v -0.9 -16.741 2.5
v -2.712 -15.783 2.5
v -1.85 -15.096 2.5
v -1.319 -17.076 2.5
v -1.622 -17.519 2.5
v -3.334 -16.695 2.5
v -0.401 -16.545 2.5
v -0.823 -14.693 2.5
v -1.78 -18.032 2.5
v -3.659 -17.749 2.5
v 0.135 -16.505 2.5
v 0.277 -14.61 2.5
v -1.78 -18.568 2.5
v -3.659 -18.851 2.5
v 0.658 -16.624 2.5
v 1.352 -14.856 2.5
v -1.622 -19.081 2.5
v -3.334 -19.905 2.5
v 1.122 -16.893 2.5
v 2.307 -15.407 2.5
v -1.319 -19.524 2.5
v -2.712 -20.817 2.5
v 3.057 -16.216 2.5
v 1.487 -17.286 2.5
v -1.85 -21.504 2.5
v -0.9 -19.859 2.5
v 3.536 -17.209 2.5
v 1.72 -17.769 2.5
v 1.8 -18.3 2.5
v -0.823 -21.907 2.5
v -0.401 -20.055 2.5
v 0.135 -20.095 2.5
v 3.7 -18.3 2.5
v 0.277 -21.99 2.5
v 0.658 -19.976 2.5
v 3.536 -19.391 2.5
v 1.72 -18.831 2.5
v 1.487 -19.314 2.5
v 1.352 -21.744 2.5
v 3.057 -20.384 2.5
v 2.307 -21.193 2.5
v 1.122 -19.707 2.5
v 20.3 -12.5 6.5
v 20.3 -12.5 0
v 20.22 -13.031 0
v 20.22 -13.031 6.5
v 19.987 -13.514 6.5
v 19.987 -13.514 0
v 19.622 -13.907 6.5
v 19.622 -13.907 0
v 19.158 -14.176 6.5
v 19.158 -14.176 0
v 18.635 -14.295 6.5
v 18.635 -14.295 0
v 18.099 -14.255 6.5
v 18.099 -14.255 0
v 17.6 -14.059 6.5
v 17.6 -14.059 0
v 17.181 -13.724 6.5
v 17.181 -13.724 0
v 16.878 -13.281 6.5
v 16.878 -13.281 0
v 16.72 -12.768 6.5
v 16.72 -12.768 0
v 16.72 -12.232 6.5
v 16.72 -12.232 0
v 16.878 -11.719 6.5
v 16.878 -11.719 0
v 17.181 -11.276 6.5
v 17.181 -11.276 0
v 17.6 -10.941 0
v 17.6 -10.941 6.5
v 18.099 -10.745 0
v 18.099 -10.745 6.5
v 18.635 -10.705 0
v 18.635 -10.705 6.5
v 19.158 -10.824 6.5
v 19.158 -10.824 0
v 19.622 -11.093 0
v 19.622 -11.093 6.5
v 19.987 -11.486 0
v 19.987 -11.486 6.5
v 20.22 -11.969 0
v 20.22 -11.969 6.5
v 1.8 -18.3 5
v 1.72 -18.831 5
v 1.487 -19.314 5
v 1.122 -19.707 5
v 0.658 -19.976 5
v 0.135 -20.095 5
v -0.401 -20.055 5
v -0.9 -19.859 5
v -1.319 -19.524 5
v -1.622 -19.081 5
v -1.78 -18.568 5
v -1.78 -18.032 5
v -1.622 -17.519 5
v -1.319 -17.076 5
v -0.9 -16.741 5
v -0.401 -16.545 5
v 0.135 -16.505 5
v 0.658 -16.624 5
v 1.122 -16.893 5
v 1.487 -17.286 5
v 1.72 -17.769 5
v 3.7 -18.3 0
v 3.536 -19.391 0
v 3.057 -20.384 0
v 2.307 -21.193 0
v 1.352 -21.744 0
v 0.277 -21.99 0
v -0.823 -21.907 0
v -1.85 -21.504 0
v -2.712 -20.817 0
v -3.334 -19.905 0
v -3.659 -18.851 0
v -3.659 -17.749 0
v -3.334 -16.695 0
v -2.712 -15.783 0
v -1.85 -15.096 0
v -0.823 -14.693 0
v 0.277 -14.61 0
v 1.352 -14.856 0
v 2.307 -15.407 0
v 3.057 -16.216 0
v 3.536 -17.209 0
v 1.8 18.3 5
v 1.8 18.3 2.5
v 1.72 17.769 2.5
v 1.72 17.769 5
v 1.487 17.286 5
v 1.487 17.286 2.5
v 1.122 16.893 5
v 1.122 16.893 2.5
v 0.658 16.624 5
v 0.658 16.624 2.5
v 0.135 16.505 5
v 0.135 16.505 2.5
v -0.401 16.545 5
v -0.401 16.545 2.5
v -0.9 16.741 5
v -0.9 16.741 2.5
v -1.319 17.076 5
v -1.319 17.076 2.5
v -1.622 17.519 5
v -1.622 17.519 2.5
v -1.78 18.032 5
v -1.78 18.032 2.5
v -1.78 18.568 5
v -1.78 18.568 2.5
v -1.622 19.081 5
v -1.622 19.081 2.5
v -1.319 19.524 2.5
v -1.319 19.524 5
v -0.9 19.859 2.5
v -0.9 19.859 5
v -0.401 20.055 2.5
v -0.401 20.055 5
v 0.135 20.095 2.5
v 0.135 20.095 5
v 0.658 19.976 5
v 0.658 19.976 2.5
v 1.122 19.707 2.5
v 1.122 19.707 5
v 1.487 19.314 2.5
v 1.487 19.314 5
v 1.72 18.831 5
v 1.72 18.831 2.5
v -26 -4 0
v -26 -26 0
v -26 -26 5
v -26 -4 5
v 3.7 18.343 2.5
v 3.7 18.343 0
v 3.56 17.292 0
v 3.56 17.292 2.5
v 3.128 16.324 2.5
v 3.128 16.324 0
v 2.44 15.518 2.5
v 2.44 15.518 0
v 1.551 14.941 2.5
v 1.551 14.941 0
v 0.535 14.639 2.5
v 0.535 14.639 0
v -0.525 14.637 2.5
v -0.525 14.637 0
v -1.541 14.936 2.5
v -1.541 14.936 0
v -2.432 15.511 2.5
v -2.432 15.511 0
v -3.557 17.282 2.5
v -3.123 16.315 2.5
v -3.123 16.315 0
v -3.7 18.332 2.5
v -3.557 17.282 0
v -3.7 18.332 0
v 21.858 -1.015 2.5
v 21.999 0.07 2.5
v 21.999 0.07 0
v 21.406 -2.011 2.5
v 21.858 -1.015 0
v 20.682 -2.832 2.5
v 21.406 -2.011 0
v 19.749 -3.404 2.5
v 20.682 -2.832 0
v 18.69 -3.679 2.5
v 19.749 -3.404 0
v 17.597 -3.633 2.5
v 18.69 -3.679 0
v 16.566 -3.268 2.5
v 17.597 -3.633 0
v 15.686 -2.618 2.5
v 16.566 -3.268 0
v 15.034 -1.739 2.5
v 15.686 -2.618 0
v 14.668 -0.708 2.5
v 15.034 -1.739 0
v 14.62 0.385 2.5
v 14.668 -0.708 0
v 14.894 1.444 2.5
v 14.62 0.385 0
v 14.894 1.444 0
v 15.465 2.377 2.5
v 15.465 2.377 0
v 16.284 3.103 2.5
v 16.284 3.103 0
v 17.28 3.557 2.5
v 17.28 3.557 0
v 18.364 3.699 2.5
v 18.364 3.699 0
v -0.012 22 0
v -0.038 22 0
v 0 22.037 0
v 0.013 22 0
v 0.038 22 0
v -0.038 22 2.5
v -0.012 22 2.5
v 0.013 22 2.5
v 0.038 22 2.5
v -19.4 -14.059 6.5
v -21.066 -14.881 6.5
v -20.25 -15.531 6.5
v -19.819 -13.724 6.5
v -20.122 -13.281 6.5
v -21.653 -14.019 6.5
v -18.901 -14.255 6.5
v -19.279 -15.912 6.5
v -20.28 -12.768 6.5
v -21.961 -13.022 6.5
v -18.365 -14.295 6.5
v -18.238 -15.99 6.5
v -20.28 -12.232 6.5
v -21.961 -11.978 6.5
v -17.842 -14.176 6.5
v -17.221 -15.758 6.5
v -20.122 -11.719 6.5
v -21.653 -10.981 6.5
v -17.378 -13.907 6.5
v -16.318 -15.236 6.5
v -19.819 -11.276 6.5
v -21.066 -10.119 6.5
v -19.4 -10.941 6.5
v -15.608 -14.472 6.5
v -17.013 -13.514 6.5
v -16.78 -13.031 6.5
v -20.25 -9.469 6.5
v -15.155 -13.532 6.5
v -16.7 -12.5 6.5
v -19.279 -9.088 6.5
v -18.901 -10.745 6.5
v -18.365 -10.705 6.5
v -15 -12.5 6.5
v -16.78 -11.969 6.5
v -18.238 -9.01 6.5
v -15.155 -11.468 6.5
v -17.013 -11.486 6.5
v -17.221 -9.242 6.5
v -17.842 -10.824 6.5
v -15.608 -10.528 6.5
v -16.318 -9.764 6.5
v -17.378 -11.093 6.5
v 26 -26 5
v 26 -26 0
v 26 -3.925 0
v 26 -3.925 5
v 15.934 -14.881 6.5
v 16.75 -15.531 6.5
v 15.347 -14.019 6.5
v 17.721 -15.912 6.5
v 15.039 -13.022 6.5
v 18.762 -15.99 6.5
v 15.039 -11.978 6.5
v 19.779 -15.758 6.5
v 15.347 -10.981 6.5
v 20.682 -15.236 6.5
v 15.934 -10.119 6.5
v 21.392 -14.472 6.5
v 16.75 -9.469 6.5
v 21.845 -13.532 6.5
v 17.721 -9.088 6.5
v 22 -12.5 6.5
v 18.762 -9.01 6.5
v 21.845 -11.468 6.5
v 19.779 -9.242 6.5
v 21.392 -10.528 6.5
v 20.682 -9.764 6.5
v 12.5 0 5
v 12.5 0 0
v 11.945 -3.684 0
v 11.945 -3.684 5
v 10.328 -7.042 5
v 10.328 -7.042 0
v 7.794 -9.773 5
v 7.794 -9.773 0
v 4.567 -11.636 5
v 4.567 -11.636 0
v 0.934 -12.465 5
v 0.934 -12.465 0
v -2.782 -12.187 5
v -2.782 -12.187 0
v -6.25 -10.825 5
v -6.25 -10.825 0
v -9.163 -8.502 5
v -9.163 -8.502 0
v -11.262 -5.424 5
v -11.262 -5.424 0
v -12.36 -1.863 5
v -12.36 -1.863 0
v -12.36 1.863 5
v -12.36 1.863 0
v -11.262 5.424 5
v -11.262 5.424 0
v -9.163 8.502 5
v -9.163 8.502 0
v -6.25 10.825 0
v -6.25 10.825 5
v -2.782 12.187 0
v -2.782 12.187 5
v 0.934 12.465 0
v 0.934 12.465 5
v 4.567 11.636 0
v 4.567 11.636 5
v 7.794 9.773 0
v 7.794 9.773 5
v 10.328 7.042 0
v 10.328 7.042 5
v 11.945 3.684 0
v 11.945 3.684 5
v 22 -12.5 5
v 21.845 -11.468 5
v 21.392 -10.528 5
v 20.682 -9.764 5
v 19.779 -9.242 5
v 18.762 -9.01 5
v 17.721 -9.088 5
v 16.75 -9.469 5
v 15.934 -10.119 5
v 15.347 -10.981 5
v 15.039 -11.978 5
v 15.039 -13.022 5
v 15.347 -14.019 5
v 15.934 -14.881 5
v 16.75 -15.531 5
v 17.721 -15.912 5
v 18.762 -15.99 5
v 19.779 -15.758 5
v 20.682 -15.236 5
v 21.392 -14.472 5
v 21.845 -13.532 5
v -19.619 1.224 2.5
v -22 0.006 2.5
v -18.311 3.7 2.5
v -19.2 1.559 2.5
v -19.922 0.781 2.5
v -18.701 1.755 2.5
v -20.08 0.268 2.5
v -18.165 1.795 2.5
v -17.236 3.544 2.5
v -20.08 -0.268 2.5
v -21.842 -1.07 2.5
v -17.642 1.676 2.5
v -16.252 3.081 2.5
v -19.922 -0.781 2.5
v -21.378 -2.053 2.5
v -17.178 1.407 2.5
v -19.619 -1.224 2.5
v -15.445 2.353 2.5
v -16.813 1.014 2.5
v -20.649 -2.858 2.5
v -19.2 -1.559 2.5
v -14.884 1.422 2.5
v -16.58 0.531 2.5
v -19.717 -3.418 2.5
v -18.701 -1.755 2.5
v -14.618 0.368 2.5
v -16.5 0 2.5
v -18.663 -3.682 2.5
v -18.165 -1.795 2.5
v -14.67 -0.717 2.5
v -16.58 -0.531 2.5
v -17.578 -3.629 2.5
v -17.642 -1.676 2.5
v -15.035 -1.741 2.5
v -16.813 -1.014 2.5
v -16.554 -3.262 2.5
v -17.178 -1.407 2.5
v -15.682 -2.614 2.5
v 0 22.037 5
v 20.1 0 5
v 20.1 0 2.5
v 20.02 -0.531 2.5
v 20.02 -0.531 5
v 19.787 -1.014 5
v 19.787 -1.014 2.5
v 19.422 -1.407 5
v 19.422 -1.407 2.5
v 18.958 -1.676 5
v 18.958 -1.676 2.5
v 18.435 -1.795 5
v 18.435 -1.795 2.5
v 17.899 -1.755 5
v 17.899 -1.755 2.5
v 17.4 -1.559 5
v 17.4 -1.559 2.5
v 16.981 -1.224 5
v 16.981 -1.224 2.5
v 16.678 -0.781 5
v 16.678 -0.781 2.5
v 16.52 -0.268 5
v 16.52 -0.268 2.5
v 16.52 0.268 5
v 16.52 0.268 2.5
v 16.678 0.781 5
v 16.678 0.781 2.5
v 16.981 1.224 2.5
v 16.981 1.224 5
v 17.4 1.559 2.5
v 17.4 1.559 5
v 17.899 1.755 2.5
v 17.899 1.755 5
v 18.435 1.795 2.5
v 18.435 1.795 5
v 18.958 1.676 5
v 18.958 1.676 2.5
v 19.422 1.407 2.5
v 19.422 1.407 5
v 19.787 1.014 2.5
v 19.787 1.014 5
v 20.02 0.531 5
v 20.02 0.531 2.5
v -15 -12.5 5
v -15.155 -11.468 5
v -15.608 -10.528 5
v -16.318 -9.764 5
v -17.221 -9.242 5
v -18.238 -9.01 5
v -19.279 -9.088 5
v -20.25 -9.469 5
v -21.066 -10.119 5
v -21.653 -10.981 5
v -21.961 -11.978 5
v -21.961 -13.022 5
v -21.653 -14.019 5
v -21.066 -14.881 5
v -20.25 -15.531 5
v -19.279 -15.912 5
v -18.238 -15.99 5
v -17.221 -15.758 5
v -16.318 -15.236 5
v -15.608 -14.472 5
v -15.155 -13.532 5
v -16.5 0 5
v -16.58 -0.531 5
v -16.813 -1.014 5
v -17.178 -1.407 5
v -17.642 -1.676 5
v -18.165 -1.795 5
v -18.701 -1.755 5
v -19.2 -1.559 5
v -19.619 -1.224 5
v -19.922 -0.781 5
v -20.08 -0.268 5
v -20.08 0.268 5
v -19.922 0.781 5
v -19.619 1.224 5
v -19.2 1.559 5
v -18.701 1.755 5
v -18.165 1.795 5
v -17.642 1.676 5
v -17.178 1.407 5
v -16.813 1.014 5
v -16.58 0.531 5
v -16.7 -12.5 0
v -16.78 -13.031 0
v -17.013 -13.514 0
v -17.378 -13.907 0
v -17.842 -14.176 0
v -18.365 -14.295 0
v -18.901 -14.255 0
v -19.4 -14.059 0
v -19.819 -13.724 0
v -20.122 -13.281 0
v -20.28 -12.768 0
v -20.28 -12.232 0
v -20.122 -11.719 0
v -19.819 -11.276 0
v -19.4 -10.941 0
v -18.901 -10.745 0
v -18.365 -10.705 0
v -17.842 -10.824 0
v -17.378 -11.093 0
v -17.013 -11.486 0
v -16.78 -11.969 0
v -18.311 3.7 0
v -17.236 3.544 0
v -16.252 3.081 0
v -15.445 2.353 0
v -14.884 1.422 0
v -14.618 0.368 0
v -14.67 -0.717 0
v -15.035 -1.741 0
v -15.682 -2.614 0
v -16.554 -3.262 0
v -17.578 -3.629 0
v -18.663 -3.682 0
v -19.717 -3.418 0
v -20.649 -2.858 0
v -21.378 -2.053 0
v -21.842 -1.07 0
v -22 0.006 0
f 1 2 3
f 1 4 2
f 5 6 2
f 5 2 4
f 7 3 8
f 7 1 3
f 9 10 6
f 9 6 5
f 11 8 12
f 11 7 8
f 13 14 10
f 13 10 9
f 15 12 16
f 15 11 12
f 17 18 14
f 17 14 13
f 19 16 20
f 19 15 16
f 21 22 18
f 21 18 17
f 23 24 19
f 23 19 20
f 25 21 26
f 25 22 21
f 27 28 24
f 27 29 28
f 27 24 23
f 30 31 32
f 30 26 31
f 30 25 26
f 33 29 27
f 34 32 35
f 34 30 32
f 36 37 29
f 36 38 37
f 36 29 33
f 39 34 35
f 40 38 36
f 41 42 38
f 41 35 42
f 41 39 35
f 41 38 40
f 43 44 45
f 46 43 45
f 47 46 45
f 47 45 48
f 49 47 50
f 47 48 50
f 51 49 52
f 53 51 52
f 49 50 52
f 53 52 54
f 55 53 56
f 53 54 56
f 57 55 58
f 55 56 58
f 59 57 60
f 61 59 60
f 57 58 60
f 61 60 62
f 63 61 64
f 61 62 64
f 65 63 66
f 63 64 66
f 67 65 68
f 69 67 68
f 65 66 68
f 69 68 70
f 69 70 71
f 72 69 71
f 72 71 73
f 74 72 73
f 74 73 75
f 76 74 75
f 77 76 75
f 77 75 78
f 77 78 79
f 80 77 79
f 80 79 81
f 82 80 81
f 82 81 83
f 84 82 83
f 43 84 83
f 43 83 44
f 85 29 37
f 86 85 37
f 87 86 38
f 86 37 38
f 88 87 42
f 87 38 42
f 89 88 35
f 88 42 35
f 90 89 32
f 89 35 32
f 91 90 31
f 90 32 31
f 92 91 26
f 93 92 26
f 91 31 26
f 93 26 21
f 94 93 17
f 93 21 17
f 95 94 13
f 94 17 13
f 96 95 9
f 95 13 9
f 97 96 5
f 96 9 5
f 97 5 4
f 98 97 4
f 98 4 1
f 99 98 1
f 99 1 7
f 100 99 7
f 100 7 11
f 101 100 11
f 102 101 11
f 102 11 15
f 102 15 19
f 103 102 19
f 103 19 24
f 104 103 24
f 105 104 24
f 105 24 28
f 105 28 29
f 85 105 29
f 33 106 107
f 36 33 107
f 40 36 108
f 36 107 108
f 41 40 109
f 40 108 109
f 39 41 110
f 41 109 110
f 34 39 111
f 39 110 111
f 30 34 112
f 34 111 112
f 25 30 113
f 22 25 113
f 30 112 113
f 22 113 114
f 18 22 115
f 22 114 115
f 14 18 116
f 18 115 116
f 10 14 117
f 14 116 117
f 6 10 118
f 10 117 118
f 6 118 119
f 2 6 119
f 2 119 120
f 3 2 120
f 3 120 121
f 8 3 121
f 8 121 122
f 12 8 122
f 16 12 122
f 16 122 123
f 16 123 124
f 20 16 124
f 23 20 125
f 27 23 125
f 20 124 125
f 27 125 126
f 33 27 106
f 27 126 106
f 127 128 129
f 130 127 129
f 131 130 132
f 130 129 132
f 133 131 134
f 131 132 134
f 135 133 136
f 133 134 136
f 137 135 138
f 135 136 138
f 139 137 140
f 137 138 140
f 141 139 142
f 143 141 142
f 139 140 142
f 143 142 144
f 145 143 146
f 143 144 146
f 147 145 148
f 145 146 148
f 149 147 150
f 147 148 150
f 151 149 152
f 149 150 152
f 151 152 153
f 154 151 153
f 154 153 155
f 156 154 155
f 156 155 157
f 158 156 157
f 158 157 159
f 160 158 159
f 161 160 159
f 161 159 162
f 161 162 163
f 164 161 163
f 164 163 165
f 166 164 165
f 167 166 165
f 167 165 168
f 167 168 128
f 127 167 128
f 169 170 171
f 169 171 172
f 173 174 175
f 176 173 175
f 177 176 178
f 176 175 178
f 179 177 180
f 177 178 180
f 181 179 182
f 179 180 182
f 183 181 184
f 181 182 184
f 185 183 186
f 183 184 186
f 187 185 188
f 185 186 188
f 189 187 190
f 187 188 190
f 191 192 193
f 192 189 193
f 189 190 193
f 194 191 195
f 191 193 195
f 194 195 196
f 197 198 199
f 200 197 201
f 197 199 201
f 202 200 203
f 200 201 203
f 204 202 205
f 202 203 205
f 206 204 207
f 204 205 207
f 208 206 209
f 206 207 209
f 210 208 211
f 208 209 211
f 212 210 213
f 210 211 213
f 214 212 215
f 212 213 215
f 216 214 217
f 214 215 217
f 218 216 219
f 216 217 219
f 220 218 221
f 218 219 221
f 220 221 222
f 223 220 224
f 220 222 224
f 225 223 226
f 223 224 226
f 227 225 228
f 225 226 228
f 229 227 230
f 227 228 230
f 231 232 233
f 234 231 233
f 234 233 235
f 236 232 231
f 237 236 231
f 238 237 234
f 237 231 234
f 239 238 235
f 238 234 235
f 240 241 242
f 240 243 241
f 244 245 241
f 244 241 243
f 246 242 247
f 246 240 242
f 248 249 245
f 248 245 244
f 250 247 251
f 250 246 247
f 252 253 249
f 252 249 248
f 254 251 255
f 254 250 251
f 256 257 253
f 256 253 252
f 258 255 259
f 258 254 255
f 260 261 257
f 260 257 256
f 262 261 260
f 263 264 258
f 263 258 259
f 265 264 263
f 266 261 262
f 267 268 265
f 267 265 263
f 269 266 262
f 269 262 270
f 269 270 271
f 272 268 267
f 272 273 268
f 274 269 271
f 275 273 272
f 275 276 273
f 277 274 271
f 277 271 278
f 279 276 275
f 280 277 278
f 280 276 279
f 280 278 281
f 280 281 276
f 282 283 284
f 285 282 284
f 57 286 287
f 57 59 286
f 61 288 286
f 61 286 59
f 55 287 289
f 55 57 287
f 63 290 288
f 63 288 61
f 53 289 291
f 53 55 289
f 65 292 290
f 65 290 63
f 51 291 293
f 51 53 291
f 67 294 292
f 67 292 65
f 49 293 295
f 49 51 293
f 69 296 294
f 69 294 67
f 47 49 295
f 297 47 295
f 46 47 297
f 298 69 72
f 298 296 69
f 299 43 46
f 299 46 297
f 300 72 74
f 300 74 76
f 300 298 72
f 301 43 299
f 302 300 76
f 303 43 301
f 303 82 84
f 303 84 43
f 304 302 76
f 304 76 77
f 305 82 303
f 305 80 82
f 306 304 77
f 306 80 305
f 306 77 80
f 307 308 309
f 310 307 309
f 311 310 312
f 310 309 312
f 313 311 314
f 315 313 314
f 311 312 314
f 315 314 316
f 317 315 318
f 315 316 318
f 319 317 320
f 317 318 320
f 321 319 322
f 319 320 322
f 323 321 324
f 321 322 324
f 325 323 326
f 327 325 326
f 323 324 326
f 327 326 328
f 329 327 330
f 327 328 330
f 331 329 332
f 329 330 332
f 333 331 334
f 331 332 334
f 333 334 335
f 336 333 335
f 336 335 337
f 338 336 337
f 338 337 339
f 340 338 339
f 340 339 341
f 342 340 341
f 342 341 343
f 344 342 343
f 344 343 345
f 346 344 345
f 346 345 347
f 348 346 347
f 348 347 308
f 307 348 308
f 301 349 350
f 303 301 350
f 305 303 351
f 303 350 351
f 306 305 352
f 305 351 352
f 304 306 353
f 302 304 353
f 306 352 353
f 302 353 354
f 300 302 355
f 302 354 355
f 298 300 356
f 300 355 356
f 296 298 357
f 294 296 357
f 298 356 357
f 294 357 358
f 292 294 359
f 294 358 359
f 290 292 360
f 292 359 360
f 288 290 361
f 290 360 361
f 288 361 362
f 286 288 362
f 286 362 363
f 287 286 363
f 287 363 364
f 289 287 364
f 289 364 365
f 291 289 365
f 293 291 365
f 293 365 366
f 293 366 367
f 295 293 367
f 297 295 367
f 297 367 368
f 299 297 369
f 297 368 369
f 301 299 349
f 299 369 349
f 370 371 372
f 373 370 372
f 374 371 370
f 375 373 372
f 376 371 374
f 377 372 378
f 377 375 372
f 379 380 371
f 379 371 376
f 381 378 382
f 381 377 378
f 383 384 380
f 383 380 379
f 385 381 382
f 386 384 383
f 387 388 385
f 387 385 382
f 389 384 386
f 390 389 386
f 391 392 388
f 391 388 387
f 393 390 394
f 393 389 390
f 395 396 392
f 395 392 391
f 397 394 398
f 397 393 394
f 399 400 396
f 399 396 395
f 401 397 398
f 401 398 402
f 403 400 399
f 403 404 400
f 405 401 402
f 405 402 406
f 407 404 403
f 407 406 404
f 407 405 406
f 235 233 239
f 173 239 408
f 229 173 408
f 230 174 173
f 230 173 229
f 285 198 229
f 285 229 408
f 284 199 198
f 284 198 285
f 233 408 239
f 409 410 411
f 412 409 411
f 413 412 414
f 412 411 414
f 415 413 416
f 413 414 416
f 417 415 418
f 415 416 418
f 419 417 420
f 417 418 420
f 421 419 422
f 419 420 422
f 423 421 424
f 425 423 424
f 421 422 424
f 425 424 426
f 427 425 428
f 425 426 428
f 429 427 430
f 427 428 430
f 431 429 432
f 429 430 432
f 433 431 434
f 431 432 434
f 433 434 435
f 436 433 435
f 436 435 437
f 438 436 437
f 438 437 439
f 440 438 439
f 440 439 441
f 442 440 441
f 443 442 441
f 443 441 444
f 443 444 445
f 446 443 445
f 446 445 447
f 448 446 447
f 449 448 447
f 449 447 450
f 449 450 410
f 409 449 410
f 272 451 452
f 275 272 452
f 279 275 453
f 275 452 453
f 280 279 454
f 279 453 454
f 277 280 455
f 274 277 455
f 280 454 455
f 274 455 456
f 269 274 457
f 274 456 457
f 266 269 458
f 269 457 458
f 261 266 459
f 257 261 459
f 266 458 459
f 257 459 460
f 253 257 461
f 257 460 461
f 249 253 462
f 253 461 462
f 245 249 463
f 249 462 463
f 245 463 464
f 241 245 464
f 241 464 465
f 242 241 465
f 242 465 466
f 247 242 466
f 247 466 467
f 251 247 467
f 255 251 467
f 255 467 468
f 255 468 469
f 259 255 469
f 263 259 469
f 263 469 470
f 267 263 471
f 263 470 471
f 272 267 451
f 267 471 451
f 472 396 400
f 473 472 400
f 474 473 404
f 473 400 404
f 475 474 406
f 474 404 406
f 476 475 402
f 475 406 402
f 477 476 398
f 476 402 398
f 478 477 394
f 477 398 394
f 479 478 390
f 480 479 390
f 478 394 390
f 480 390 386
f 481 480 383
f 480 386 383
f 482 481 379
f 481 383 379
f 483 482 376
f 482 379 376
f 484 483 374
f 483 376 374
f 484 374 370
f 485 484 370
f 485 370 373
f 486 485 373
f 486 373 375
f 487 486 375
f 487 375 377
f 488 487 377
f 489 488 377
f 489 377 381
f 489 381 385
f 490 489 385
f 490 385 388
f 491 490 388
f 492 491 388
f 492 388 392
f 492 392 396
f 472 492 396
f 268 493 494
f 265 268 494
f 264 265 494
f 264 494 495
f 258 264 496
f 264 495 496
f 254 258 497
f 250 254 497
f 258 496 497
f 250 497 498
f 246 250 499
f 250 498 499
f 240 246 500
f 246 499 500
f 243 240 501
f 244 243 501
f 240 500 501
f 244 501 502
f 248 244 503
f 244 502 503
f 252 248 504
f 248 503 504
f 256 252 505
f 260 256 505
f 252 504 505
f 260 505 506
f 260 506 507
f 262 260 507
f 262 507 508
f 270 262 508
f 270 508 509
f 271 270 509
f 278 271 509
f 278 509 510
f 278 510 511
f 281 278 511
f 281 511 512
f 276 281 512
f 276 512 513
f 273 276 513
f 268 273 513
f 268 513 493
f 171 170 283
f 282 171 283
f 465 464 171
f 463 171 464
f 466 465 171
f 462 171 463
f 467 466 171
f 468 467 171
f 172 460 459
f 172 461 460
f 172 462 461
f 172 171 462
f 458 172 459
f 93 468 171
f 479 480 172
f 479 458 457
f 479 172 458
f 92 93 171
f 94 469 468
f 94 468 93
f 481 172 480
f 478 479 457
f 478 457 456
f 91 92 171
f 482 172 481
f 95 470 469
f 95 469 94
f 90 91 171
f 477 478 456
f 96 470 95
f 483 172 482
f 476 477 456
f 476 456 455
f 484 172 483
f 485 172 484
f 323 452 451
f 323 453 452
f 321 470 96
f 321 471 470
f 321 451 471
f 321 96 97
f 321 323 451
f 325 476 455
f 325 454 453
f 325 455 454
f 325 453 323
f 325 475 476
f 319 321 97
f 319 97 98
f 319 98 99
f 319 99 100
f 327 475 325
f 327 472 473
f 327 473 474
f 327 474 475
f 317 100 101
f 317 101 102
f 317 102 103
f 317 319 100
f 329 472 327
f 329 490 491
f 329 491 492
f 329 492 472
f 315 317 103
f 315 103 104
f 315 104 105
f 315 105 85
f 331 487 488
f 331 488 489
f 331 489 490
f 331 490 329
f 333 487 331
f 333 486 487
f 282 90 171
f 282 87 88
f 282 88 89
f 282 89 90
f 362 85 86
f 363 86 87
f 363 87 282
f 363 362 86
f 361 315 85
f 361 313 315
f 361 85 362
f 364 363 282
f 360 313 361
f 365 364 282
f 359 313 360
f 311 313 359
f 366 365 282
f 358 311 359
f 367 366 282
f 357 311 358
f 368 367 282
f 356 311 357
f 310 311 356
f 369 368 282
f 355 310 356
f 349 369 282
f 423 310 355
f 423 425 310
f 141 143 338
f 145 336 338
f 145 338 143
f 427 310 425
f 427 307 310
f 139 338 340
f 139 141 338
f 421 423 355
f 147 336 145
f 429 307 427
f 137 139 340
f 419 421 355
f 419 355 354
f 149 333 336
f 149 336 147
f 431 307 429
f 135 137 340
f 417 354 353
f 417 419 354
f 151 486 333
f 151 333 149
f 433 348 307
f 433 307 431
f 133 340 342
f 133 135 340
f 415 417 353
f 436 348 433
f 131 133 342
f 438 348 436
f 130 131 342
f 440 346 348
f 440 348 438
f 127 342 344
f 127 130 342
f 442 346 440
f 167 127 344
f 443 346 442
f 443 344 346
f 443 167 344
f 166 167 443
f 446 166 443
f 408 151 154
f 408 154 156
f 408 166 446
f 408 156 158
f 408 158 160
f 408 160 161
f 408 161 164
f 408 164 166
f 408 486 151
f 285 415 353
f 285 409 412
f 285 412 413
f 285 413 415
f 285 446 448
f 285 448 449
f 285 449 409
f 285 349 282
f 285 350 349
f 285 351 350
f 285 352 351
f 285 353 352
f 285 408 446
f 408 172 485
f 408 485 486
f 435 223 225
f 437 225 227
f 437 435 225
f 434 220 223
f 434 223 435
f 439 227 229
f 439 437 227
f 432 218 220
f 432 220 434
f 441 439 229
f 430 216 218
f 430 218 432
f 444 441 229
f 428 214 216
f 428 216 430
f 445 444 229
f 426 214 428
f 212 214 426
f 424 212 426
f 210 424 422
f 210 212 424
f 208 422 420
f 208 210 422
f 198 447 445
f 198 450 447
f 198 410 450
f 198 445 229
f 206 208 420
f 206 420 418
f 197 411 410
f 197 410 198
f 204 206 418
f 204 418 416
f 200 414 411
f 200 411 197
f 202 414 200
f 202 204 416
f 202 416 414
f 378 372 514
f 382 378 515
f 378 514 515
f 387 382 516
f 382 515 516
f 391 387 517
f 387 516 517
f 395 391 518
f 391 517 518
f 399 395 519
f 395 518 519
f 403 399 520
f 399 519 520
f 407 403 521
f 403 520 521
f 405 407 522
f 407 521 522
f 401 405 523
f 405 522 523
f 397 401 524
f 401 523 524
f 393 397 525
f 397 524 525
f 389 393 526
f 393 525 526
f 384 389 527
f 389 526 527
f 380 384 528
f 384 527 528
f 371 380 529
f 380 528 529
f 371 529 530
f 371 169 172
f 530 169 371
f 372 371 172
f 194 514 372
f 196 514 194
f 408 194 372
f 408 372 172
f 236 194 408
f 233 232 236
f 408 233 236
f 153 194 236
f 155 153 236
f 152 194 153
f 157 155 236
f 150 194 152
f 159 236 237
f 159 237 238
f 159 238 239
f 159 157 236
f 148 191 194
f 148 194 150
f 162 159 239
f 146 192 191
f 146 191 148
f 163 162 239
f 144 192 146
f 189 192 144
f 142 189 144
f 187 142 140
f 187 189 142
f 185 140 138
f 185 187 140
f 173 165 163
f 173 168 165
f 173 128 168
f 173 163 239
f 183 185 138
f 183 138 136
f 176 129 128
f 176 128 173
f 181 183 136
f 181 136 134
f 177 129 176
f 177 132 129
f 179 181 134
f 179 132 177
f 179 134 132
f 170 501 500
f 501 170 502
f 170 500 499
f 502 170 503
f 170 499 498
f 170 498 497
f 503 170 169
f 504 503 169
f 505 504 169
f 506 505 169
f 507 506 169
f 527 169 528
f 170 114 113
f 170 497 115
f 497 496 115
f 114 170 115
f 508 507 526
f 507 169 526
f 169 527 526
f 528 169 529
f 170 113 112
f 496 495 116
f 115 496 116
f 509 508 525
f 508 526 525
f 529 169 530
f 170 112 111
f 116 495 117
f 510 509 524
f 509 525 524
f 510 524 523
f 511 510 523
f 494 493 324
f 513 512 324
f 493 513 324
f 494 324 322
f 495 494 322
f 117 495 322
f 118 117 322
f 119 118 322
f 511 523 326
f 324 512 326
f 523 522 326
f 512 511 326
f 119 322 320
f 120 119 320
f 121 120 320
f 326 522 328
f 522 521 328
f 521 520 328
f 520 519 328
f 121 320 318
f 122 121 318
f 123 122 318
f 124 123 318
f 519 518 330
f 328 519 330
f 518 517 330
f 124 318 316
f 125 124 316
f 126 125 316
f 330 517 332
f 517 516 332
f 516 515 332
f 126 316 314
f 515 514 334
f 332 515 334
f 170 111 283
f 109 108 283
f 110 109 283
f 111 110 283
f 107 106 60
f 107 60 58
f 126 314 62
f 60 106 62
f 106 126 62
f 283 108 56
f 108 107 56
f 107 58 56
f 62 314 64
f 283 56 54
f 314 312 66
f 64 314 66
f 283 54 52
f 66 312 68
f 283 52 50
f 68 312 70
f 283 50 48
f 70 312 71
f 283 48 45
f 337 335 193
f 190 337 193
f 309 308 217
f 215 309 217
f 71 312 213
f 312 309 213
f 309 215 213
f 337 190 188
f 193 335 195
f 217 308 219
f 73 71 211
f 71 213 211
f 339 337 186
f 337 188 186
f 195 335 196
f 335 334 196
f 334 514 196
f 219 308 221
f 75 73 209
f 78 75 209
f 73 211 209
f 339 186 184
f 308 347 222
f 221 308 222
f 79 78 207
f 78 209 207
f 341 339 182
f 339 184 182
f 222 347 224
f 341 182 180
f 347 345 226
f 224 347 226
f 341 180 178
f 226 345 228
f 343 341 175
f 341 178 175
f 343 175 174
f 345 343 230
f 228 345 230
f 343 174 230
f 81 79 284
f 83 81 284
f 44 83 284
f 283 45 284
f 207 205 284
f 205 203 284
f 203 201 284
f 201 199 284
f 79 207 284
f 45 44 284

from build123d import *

# Parameters (mm, degrees)
SKETCH_W        = 52
SKETCH_H        = 52
PAD_DEPTH       = 5
SKETCH005_R     = 3.5
PAD001_DEPTH    = 1.5
SKETCH001_R     = 12.5
SKETCH001_R_2   = 1.8
POCKET_DEPTH    = 6.501
SKETCH006_R     = 3.7
POCKET001_DEPTH = 2.5


with BuildPart() as part:
    # Sketch → Pad (new body)
    with BuildSketch(Plane.XY):
        Rectangle(SKETCH_W, SKETCH_H)
    extrude(amount=PAD_DEPTH)

    # Sketch005 → Pad001 (new body)
    with BuildSketch(Plane.XY.offset(5)):
        with Locations((-18.5, -12.5)):
            Circle(SKETCH005_R)
        with Locations((18.5, -12.5)):
            Circle(SKETCH005_R)
    extrude(amount=PAD001_DEPTH)

    # Sketch001 → Pocket (cut, through all)
    with BuildSketch(Plane(origin=(0, 0, 0), x_dir=(1, 0, 0), z_dir=(0, 0, -1))):
        Circle(SKETCH001_R)
        with Locations((0, 18.3)):
            Circle(SKETCH001_R_2)
        with Locations((0, -18.3)):
            Circle(SKETCH001_R_2)
        with Locations((-18.3, 0)):
            Circle(SKETCH001_R_2)
        with Locations((18.3, 0)):
            Circle(SKETCH001_R_2)
        with Locations((-18.5, 12.5)):
            Circle(SKETCH001_R_2)
        with Locations((18.5, 12.5)):
            Circle(SKETCH001_R_2)
        Polygon((-26, 4), (0, -22.037422), (26.037481, 3.962637), (26.037481, -34), (-26, -34), align=None)
    extrude(amount=-POCKET_DEPTH, mode=Mode.SUBTRACT)

    # Sketch006 → Pocket001 (cut)
    with BuildSketch(Plane(origin=(0, 0, 0), x_dir=(1, 0, 0), z_dir=(0, 0, -1))):
        with Locations((-18.3, 0)):
            Circle(SKETCH006_R)
        with Locations((0, 18.3)):
            Circle(SKETCH006_R)
        with Locations((18.3, 0)):
            Circle(SKETCH006_R)
        with Locations((0, -18.3)):
            Circle(SKETCH006_R)
    extrude(amount=-POCKET001_DEPTH, mode=Mode.SUBTRACT)


solid = part.part
